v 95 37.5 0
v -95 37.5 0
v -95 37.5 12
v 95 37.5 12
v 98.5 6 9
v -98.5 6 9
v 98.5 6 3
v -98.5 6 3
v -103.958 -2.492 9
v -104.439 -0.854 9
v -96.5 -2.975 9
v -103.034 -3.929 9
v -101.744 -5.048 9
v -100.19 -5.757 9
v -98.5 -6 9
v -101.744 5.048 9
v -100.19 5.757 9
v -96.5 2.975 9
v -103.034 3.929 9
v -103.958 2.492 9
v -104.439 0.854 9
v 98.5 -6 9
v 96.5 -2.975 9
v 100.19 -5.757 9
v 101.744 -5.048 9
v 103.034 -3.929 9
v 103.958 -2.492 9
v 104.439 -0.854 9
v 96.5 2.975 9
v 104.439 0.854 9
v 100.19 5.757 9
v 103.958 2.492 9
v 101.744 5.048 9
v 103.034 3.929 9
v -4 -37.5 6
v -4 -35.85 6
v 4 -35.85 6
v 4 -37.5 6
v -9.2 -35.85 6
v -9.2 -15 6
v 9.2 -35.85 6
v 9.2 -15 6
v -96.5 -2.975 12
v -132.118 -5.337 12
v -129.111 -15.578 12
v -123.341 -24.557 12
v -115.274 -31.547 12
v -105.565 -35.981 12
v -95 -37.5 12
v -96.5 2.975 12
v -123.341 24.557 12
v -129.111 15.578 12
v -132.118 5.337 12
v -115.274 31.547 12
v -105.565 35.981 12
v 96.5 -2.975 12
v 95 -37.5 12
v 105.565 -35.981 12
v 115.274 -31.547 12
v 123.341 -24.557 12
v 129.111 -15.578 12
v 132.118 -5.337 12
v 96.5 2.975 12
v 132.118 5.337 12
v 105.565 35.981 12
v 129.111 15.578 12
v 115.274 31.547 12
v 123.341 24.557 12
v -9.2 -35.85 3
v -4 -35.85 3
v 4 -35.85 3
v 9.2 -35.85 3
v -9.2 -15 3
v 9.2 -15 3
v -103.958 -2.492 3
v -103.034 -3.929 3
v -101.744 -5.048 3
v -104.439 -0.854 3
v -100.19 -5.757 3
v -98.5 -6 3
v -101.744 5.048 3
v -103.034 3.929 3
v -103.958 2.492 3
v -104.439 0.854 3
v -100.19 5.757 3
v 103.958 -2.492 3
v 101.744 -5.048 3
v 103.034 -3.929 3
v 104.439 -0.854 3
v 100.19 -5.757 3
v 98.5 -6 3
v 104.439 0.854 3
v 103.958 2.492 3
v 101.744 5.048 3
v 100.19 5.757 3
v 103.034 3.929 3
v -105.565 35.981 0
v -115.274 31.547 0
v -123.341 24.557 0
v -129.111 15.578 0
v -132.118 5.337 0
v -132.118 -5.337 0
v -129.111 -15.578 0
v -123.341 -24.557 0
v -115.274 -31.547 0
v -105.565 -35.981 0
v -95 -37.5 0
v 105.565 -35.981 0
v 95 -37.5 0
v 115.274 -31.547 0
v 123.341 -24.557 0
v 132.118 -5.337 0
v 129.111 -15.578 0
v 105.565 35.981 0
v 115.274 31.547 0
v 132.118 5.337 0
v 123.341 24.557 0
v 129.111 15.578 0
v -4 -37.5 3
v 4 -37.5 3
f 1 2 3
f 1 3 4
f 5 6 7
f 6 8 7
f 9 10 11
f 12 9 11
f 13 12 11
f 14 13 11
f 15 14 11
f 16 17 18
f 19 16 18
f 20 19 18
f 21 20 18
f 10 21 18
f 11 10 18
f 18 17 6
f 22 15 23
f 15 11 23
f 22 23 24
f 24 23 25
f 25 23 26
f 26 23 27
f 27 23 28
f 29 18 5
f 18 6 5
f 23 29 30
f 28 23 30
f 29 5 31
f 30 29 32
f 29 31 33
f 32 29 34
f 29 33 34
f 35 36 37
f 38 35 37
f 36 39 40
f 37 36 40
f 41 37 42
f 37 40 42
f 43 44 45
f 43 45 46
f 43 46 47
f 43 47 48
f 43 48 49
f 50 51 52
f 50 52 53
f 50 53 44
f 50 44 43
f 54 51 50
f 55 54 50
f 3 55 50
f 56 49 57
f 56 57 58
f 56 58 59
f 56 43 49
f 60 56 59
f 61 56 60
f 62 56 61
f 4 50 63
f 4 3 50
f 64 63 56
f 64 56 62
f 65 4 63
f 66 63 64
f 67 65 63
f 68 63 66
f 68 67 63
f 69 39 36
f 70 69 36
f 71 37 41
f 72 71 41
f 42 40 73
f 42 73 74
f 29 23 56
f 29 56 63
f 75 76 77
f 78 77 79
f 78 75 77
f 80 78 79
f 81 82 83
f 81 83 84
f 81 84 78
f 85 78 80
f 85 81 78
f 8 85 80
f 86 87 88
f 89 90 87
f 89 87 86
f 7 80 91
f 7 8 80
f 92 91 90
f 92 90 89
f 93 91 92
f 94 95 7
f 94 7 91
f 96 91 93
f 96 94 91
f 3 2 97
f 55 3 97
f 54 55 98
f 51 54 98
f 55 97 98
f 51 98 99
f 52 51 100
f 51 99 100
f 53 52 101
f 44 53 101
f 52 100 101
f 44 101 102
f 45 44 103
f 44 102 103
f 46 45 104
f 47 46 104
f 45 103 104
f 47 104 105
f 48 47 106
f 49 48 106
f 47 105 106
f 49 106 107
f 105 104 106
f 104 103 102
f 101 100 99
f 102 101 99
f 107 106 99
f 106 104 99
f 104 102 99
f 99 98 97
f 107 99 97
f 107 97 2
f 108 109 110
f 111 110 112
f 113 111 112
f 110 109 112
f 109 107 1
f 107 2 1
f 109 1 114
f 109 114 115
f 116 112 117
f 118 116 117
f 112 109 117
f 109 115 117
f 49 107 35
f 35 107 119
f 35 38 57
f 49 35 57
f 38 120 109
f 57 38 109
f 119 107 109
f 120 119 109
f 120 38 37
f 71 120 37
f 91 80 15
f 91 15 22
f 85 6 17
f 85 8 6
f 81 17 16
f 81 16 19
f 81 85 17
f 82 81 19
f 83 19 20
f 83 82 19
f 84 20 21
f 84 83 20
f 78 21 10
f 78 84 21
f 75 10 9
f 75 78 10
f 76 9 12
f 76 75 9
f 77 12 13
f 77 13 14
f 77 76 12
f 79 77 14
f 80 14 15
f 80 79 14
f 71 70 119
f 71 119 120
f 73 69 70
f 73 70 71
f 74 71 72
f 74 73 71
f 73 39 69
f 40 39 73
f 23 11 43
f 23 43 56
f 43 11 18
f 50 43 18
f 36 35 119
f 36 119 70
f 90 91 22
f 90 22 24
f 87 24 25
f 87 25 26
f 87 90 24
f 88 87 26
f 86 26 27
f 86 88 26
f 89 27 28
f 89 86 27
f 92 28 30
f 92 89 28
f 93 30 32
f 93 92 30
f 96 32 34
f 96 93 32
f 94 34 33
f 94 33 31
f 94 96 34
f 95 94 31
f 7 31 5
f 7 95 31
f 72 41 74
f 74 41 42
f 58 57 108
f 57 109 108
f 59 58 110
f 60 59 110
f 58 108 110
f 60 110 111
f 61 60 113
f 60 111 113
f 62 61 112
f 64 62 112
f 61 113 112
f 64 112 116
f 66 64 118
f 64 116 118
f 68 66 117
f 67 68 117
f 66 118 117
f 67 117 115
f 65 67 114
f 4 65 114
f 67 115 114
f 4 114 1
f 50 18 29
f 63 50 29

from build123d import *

# Parameters (mm, degrees)
PAD_DEPTH       = 6
POCKET_DEPTH    = 3
SKETCH002_W     = 18.4
SKETCH002_H     = 20.85
POCKET001_DEPTH = 3
SKETCH003_W     = 8
SKETCH003_H     = 1.65
POCKET002_DEPTH = 3
PAD001_DEPTH    = 3
SKETCH005_W     = 193
SKETCH005_H     = 5.95
PAD002_DEPTH    = 3


with BuildPart() as part:
    # Sketch → Pad (new body)
    with BuildSketch(Plane.XY):
        with BuildLine():
            ThreePointArc((-95, 37.5), (-132.5, 0), (-95, -37.5))
            Line((-95, -37.5), (95, -37.5))
            ThreePointArc((95, -37.5), (132.5, 0), (95, 37.5))
            Line((-95, 37.5), (95, 37.5))
        make_face()
    extrude(amount=PAD_DEPTH)

    # Sketch001 (on Face6 of Pad) → Pocket (cut)
    with BuildSketch(Plane.XY.offset(6)):
        with BuildLine():
            ThreePointArc((-98.5, 6), (-104.5, 0), (-98.5, -6))
            Line((-98.5, -6), (98.5, -6))
            ThreePointArc((98.5, -6), (104.5, 0), (98.5, 6))
            Line((-98.5, 6), (98.5, 6))
        make_face()
    extrude(amount=-POCKET_DEPTH, mode=Mode.SUBTRACT)

    # Sketch002 (on Face5 of Pocket) → Pocket001 (cut)
    with BuildSketch(Plane.XY.offset(6)):
        with Locations((0, -25.425)):
            Rectangle(SKETCH002_W, SKETCH002_H)
    extrude(amount=-POCKET001_DEPTH, mode=Mode.SUBTRACT)

    # Sketch003 (on Face5 of Pocket001) → Pocket002 (cut)
    with BuildSketch(Plane.XY.offset(6)):
        with Locations((0, -36.675)):
            Rectangle(SKETCH003_W, SKETCH003_H)
    extrude(amount=-POCKET002_DEPTH, mode=Mode.SUBTRACT)

    # Sketch004 (on Face5 of Pocket002) → Pad001 (join)
    with BuildSketch(Plane.XY.offset(6)):
        with BuildLine():
            ThreePointArc((-95, 37.5), (-132.5, 0), (-95, -37.5))
            Line((-95, -37.5), (95, -37.5))
            ThreePointArc((95, -37.5), (132.5, 0), (95, 37.5))
            Line((-95, 37.5), (95, 37.5))
        make_face()
        with BuildLine():
            ThreePointArc((-98.5, 6), (-104.5, 0), (-98.5, -6))
            Line((-98.5, -6), (98.5, -6))
            ThreePointArc((98.5, -6), (104.5, 0), (98.5, 6))
            Line((-98.5, 6), (98.5, 6))
        make_face(mode=Mode.SUBTRACT)
    extrude(amount=PAD001_DEPTH)

    # Sketch005 (on Face12 of Pad001) → Pad002 (join)
    with BuildSketch(Plane.XY.offset(9)):
        with BuildLine():
            ThreePointArc((-95, 37.5), (-132.5, 0), (-95, -37.5))
            Line((-95, -37.5), (95, -37.5))
            ThreePointArc((95, -37.5), (132.5, 0), (95, 37.5))
            Line((-95, 37.5), (95, 37.5))
        make_face()
        Rectangle(SKETCH005_W, SKETCH005_H, mode=Mode.SUBTRACT)
    extrude(amount=PAD002_DEPTH)


solid = part.part
